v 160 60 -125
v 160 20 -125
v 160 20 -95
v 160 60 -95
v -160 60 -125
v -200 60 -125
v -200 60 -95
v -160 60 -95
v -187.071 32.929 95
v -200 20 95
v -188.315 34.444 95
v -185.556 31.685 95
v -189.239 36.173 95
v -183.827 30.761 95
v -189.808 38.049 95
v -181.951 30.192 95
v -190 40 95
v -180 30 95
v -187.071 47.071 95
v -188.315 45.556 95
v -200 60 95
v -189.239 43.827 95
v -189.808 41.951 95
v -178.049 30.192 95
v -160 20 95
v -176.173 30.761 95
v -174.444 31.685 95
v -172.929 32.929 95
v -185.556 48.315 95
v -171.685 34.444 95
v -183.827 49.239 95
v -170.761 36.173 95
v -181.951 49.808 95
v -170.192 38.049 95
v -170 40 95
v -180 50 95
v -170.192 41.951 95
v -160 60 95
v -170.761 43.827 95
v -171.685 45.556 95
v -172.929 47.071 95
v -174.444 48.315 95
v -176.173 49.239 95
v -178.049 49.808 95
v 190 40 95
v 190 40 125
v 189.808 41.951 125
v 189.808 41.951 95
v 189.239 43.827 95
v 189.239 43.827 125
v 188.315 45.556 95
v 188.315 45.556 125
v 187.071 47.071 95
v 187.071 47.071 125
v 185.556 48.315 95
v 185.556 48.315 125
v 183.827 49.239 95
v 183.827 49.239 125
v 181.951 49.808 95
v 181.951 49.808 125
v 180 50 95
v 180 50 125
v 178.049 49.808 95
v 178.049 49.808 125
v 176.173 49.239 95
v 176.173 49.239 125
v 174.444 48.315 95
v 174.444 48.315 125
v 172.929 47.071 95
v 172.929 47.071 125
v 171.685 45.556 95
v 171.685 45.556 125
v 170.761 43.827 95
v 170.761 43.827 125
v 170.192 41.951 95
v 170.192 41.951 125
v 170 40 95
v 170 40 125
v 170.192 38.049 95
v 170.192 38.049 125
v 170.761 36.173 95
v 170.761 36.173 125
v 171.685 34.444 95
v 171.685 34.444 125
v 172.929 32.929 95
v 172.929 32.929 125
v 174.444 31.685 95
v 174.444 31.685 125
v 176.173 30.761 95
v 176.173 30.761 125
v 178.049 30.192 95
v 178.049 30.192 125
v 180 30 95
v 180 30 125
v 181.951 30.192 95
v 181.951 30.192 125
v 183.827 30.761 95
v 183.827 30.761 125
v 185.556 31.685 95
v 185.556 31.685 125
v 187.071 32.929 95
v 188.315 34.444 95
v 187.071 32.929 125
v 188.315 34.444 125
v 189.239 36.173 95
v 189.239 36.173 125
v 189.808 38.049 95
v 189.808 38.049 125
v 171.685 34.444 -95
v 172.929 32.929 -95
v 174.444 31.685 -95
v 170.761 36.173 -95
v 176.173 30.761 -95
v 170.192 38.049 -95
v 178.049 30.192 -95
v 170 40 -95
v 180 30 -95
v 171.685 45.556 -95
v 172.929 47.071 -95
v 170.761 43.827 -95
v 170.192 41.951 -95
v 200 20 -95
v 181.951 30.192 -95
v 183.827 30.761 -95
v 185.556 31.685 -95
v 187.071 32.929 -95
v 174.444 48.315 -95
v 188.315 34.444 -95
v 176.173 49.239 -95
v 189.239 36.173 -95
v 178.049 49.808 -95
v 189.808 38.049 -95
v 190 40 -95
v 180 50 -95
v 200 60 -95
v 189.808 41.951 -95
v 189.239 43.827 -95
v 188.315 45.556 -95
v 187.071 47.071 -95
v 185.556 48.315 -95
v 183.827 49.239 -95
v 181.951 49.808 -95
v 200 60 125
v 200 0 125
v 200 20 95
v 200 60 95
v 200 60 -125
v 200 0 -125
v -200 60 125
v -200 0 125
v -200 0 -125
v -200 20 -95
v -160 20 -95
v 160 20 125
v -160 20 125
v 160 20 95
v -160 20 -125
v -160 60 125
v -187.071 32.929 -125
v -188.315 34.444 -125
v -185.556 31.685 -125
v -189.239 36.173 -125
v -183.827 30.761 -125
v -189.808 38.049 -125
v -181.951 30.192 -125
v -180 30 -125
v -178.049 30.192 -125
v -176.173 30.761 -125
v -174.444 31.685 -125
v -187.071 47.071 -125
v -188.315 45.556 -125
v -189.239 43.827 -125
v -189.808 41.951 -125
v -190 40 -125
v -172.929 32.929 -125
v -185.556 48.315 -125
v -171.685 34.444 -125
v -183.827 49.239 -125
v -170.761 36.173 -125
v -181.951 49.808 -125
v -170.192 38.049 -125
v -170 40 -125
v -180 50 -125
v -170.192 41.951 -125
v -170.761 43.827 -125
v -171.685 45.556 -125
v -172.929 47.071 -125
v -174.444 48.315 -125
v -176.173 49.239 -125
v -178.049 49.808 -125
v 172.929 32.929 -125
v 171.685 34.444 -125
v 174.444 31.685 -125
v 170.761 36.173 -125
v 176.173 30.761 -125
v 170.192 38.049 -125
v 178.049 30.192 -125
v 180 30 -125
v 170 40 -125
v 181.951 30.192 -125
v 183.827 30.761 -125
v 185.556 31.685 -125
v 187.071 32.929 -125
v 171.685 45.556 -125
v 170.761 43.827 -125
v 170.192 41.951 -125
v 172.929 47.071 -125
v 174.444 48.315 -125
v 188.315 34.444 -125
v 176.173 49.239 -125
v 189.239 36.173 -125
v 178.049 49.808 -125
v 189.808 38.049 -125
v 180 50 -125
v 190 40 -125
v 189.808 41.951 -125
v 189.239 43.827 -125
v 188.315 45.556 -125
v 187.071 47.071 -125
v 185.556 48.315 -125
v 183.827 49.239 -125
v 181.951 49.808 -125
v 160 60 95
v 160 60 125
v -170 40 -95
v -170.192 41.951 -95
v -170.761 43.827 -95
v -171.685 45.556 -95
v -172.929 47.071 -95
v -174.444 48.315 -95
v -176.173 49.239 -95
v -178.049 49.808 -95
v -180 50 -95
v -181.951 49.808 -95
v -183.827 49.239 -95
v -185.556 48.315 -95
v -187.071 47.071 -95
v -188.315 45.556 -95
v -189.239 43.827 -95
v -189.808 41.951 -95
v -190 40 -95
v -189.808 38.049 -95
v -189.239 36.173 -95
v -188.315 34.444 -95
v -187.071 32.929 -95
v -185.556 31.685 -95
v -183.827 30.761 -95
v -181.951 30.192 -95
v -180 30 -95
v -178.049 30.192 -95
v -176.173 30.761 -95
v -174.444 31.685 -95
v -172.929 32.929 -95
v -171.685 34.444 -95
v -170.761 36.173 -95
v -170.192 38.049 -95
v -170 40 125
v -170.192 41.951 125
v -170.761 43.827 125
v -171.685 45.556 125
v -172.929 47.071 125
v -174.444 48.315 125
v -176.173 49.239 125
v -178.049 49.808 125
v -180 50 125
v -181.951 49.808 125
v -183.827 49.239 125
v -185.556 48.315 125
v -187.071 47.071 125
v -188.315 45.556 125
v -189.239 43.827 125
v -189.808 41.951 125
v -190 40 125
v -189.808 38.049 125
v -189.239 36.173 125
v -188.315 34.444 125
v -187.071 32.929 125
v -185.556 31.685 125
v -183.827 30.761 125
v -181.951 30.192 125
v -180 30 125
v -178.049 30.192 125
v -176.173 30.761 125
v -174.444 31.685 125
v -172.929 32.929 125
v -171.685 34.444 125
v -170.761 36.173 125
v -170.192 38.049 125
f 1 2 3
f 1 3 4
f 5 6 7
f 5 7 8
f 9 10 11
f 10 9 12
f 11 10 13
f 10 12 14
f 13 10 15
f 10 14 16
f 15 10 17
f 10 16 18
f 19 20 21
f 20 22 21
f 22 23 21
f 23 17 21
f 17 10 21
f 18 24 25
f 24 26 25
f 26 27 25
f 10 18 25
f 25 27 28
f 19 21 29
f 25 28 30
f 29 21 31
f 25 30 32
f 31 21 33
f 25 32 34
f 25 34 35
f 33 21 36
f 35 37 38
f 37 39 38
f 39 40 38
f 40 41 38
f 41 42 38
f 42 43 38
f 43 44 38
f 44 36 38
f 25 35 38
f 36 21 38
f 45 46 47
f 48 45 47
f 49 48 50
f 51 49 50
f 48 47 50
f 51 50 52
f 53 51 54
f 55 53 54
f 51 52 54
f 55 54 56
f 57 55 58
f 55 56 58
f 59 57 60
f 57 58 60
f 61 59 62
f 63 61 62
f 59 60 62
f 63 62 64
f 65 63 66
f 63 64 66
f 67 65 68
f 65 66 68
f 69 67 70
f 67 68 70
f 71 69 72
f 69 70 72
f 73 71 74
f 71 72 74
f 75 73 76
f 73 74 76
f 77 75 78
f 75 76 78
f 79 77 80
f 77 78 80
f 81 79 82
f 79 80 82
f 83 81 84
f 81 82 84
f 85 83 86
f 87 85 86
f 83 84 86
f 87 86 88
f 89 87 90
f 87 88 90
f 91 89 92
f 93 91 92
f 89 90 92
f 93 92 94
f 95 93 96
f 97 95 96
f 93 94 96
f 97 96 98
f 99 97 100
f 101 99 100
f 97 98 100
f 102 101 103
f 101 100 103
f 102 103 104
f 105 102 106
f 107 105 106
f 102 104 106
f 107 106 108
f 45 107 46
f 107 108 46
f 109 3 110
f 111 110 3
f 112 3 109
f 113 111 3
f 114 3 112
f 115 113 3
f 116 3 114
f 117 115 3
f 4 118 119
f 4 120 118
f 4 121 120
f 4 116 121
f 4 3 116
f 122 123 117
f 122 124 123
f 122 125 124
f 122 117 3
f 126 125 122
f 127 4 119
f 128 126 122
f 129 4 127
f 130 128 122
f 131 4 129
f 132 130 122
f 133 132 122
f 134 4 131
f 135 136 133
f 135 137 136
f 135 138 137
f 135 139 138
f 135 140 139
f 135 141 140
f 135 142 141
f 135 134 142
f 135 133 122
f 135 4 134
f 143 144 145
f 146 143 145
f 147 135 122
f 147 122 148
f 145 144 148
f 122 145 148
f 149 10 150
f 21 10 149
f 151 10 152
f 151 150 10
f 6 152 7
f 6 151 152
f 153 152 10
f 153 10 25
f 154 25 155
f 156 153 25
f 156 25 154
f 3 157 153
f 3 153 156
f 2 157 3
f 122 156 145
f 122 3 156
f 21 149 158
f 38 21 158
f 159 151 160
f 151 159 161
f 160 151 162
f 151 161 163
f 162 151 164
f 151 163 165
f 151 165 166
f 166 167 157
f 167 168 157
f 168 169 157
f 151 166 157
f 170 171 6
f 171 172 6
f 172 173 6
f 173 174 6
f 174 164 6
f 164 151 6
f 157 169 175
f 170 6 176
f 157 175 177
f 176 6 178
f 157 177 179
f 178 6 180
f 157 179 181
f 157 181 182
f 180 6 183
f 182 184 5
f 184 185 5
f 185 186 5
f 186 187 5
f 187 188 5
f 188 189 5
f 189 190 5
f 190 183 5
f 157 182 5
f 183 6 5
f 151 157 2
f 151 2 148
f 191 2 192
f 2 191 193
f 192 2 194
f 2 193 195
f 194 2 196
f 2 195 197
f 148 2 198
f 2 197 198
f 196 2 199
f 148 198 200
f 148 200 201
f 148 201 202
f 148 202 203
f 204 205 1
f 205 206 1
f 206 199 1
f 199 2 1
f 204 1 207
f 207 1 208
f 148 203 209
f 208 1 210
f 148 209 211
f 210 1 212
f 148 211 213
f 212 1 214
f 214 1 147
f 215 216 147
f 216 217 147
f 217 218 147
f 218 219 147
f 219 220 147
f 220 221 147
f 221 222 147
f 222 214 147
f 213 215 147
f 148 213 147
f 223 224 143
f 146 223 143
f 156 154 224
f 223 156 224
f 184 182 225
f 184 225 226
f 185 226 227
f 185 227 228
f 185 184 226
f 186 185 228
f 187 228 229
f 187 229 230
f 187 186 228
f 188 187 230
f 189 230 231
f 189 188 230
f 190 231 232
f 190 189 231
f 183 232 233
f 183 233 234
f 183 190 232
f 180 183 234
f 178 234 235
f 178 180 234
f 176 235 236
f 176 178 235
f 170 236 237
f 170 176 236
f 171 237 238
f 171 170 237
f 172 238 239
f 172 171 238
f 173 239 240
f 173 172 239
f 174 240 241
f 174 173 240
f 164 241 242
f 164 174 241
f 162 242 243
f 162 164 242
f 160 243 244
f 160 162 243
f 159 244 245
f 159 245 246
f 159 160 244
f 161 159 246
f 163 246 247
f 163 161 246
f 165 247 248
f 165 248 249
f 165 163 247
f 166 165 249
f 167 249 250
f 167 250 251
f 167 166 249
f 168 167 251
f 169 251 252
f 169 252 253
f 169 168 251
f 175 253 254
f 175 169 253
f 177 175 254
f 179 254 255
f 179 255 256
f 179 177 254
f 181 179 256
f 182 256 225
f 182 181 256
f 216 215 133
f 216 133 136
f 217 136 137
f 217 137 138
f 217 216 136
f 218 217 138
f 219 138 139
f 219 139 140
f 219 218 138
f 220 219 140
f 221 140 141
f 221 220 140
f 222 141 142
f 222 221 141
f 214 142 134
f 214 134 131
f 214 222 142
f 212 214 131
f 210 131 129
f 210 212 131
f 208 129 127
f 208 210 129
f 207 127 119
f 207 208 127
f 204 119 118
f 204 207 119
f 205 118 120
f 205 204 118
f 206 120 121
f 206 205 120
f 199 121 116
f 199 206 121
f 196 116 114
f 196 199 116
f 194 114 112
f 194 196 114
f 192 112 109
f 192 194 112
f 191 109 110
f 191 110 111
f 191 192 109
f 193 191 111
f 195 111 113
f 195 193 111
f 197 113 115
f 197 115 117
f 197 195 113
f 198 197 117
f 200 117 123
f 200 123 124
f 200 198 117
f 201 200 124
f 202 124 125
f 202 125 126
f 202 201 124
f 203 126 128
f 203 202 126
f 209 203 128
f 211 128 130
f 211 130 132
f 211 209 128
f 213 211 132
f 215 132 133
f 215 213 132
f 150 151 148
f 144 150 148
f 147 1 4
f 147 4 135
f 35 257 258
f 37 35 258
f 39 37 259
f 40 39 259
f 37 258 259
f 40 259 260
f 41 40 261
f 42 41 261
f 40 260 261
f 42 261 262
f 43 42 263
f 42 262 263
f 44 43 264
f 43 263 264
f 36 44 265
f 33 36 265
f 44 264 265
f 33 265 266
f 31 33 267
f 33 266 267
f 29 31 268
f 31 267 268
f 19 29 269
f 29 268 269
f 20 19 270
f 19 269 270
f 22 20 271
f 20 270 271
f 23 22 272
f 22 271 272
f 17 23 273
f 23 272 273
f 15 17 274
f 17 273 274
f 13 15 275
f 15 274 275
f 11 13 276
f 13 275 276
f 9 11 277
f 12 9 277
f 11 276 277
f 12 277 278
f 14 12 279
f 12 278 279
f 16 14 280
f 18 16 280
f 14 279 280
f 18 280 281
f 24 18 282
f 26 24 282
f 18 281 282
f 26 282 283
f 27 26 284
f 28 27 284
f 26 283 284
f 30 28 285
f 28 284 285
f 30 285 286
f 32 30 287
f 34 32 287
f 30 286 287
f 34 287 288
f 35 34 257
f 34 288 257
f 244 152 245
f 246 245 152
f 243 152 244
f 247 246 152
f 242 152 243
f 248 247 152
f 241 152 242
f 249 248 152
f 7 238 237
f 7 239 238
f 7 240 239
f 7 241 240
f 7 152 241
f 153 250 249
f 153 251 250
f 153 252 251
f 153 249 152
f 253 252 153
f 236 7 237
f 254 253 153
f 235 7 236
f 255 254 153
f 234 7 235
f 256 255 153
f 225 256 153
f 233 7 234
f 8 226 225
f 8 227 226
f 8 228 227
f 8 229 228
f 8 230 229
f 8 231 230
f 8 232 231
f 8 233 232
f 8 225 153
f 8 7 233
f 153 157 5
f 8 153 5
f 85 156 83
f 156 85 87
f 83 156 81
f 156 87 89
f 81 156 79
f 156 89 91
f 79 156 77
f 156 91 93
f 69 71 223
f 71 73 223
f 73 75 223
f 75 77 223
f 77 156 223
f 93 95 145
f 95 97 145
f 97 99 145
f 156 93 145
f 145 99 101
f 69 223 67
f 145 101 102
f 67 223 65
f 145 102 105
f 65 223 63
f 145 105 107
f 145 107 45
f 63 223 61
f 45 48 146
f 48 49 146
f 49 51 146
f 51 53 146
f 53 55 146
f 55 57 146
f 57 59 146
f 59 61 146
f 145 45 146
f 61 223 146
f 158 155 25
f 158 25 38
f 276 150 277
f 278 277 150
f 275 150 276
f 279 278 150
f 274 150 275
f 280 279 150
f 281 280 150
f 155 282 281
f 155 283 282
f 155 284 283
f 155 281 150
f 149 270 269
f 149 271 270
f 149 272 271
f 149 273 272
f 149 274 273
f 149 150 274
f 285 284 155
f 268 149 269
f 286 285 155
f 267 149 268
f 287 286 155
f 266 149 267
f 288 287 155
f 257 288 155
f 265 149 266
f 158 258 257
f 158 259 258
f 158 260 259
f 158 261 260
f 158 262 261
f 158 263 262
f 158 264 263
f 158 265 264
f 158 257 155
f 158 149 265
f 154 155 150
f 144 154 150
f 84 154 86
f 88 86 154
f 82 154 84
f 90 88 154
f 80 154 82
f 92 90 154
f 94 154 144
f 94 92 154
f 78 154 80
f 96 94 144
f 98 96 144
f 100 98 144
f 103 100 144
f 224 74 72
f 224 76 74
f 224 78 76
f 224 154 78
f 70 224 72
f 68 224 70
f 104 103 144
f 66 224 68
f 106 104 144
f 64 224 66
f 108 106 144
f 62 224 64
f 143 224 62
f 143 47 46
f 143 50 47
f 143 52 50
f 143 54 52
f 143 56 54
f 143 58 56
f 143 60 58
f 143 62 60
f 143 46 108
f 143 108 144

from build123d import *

# Parameters (mm, degrees)
SKETCH1_W           = 400
SKETCH1_H           = 250
BOSS_EXTRUDE1_DEPTH = 20
SKETCH2_W           = 40
SKETCH2_H           = 40
SKETCH2_R           = 10
BOSS_EXTRUDE2_DEPTH = 30


with BuildPart() as part:
    # Sketch1 → Boss-Extrude1 (new body)
    with BuildSketch(Plane(origin=(0, 0, 0), x_dir=(1, 0, 0), z_dir=(0, 1, 0))):
        Rectangle(SKETCH1_W, SKETCH1_H)
    extrude(amount=BOSS_EXTRUDE1_DEPTH)

    # Sketch2 → Boss-Extrude2 (add)
    with BuildSketch(Plane.XY.offset(125)):
        with Locations((-180, 40)):
            Rectangle(SKETCH2_W, SKETCH2_H)
        with Locations((-180, 40)):
            Circle(SKETCH2_R, mode=Mode.SUBTRACT)
        with Locations((180, 40)):
            Rectangle(SKETCH2_W, SKETCH2_H)
        with Locations((180, 40)):
            Circle(SKETCH2_R, mode=Mode.SUBTRACT)
    boss_extrude2 = extrude(amount=-BOSS_EXTRUDE2_DEPTH)

    # Mirror1: Boss-Extrude2 across plane
    add(boss_extrude2.mirror(Plane.XY))


solid = part.part
